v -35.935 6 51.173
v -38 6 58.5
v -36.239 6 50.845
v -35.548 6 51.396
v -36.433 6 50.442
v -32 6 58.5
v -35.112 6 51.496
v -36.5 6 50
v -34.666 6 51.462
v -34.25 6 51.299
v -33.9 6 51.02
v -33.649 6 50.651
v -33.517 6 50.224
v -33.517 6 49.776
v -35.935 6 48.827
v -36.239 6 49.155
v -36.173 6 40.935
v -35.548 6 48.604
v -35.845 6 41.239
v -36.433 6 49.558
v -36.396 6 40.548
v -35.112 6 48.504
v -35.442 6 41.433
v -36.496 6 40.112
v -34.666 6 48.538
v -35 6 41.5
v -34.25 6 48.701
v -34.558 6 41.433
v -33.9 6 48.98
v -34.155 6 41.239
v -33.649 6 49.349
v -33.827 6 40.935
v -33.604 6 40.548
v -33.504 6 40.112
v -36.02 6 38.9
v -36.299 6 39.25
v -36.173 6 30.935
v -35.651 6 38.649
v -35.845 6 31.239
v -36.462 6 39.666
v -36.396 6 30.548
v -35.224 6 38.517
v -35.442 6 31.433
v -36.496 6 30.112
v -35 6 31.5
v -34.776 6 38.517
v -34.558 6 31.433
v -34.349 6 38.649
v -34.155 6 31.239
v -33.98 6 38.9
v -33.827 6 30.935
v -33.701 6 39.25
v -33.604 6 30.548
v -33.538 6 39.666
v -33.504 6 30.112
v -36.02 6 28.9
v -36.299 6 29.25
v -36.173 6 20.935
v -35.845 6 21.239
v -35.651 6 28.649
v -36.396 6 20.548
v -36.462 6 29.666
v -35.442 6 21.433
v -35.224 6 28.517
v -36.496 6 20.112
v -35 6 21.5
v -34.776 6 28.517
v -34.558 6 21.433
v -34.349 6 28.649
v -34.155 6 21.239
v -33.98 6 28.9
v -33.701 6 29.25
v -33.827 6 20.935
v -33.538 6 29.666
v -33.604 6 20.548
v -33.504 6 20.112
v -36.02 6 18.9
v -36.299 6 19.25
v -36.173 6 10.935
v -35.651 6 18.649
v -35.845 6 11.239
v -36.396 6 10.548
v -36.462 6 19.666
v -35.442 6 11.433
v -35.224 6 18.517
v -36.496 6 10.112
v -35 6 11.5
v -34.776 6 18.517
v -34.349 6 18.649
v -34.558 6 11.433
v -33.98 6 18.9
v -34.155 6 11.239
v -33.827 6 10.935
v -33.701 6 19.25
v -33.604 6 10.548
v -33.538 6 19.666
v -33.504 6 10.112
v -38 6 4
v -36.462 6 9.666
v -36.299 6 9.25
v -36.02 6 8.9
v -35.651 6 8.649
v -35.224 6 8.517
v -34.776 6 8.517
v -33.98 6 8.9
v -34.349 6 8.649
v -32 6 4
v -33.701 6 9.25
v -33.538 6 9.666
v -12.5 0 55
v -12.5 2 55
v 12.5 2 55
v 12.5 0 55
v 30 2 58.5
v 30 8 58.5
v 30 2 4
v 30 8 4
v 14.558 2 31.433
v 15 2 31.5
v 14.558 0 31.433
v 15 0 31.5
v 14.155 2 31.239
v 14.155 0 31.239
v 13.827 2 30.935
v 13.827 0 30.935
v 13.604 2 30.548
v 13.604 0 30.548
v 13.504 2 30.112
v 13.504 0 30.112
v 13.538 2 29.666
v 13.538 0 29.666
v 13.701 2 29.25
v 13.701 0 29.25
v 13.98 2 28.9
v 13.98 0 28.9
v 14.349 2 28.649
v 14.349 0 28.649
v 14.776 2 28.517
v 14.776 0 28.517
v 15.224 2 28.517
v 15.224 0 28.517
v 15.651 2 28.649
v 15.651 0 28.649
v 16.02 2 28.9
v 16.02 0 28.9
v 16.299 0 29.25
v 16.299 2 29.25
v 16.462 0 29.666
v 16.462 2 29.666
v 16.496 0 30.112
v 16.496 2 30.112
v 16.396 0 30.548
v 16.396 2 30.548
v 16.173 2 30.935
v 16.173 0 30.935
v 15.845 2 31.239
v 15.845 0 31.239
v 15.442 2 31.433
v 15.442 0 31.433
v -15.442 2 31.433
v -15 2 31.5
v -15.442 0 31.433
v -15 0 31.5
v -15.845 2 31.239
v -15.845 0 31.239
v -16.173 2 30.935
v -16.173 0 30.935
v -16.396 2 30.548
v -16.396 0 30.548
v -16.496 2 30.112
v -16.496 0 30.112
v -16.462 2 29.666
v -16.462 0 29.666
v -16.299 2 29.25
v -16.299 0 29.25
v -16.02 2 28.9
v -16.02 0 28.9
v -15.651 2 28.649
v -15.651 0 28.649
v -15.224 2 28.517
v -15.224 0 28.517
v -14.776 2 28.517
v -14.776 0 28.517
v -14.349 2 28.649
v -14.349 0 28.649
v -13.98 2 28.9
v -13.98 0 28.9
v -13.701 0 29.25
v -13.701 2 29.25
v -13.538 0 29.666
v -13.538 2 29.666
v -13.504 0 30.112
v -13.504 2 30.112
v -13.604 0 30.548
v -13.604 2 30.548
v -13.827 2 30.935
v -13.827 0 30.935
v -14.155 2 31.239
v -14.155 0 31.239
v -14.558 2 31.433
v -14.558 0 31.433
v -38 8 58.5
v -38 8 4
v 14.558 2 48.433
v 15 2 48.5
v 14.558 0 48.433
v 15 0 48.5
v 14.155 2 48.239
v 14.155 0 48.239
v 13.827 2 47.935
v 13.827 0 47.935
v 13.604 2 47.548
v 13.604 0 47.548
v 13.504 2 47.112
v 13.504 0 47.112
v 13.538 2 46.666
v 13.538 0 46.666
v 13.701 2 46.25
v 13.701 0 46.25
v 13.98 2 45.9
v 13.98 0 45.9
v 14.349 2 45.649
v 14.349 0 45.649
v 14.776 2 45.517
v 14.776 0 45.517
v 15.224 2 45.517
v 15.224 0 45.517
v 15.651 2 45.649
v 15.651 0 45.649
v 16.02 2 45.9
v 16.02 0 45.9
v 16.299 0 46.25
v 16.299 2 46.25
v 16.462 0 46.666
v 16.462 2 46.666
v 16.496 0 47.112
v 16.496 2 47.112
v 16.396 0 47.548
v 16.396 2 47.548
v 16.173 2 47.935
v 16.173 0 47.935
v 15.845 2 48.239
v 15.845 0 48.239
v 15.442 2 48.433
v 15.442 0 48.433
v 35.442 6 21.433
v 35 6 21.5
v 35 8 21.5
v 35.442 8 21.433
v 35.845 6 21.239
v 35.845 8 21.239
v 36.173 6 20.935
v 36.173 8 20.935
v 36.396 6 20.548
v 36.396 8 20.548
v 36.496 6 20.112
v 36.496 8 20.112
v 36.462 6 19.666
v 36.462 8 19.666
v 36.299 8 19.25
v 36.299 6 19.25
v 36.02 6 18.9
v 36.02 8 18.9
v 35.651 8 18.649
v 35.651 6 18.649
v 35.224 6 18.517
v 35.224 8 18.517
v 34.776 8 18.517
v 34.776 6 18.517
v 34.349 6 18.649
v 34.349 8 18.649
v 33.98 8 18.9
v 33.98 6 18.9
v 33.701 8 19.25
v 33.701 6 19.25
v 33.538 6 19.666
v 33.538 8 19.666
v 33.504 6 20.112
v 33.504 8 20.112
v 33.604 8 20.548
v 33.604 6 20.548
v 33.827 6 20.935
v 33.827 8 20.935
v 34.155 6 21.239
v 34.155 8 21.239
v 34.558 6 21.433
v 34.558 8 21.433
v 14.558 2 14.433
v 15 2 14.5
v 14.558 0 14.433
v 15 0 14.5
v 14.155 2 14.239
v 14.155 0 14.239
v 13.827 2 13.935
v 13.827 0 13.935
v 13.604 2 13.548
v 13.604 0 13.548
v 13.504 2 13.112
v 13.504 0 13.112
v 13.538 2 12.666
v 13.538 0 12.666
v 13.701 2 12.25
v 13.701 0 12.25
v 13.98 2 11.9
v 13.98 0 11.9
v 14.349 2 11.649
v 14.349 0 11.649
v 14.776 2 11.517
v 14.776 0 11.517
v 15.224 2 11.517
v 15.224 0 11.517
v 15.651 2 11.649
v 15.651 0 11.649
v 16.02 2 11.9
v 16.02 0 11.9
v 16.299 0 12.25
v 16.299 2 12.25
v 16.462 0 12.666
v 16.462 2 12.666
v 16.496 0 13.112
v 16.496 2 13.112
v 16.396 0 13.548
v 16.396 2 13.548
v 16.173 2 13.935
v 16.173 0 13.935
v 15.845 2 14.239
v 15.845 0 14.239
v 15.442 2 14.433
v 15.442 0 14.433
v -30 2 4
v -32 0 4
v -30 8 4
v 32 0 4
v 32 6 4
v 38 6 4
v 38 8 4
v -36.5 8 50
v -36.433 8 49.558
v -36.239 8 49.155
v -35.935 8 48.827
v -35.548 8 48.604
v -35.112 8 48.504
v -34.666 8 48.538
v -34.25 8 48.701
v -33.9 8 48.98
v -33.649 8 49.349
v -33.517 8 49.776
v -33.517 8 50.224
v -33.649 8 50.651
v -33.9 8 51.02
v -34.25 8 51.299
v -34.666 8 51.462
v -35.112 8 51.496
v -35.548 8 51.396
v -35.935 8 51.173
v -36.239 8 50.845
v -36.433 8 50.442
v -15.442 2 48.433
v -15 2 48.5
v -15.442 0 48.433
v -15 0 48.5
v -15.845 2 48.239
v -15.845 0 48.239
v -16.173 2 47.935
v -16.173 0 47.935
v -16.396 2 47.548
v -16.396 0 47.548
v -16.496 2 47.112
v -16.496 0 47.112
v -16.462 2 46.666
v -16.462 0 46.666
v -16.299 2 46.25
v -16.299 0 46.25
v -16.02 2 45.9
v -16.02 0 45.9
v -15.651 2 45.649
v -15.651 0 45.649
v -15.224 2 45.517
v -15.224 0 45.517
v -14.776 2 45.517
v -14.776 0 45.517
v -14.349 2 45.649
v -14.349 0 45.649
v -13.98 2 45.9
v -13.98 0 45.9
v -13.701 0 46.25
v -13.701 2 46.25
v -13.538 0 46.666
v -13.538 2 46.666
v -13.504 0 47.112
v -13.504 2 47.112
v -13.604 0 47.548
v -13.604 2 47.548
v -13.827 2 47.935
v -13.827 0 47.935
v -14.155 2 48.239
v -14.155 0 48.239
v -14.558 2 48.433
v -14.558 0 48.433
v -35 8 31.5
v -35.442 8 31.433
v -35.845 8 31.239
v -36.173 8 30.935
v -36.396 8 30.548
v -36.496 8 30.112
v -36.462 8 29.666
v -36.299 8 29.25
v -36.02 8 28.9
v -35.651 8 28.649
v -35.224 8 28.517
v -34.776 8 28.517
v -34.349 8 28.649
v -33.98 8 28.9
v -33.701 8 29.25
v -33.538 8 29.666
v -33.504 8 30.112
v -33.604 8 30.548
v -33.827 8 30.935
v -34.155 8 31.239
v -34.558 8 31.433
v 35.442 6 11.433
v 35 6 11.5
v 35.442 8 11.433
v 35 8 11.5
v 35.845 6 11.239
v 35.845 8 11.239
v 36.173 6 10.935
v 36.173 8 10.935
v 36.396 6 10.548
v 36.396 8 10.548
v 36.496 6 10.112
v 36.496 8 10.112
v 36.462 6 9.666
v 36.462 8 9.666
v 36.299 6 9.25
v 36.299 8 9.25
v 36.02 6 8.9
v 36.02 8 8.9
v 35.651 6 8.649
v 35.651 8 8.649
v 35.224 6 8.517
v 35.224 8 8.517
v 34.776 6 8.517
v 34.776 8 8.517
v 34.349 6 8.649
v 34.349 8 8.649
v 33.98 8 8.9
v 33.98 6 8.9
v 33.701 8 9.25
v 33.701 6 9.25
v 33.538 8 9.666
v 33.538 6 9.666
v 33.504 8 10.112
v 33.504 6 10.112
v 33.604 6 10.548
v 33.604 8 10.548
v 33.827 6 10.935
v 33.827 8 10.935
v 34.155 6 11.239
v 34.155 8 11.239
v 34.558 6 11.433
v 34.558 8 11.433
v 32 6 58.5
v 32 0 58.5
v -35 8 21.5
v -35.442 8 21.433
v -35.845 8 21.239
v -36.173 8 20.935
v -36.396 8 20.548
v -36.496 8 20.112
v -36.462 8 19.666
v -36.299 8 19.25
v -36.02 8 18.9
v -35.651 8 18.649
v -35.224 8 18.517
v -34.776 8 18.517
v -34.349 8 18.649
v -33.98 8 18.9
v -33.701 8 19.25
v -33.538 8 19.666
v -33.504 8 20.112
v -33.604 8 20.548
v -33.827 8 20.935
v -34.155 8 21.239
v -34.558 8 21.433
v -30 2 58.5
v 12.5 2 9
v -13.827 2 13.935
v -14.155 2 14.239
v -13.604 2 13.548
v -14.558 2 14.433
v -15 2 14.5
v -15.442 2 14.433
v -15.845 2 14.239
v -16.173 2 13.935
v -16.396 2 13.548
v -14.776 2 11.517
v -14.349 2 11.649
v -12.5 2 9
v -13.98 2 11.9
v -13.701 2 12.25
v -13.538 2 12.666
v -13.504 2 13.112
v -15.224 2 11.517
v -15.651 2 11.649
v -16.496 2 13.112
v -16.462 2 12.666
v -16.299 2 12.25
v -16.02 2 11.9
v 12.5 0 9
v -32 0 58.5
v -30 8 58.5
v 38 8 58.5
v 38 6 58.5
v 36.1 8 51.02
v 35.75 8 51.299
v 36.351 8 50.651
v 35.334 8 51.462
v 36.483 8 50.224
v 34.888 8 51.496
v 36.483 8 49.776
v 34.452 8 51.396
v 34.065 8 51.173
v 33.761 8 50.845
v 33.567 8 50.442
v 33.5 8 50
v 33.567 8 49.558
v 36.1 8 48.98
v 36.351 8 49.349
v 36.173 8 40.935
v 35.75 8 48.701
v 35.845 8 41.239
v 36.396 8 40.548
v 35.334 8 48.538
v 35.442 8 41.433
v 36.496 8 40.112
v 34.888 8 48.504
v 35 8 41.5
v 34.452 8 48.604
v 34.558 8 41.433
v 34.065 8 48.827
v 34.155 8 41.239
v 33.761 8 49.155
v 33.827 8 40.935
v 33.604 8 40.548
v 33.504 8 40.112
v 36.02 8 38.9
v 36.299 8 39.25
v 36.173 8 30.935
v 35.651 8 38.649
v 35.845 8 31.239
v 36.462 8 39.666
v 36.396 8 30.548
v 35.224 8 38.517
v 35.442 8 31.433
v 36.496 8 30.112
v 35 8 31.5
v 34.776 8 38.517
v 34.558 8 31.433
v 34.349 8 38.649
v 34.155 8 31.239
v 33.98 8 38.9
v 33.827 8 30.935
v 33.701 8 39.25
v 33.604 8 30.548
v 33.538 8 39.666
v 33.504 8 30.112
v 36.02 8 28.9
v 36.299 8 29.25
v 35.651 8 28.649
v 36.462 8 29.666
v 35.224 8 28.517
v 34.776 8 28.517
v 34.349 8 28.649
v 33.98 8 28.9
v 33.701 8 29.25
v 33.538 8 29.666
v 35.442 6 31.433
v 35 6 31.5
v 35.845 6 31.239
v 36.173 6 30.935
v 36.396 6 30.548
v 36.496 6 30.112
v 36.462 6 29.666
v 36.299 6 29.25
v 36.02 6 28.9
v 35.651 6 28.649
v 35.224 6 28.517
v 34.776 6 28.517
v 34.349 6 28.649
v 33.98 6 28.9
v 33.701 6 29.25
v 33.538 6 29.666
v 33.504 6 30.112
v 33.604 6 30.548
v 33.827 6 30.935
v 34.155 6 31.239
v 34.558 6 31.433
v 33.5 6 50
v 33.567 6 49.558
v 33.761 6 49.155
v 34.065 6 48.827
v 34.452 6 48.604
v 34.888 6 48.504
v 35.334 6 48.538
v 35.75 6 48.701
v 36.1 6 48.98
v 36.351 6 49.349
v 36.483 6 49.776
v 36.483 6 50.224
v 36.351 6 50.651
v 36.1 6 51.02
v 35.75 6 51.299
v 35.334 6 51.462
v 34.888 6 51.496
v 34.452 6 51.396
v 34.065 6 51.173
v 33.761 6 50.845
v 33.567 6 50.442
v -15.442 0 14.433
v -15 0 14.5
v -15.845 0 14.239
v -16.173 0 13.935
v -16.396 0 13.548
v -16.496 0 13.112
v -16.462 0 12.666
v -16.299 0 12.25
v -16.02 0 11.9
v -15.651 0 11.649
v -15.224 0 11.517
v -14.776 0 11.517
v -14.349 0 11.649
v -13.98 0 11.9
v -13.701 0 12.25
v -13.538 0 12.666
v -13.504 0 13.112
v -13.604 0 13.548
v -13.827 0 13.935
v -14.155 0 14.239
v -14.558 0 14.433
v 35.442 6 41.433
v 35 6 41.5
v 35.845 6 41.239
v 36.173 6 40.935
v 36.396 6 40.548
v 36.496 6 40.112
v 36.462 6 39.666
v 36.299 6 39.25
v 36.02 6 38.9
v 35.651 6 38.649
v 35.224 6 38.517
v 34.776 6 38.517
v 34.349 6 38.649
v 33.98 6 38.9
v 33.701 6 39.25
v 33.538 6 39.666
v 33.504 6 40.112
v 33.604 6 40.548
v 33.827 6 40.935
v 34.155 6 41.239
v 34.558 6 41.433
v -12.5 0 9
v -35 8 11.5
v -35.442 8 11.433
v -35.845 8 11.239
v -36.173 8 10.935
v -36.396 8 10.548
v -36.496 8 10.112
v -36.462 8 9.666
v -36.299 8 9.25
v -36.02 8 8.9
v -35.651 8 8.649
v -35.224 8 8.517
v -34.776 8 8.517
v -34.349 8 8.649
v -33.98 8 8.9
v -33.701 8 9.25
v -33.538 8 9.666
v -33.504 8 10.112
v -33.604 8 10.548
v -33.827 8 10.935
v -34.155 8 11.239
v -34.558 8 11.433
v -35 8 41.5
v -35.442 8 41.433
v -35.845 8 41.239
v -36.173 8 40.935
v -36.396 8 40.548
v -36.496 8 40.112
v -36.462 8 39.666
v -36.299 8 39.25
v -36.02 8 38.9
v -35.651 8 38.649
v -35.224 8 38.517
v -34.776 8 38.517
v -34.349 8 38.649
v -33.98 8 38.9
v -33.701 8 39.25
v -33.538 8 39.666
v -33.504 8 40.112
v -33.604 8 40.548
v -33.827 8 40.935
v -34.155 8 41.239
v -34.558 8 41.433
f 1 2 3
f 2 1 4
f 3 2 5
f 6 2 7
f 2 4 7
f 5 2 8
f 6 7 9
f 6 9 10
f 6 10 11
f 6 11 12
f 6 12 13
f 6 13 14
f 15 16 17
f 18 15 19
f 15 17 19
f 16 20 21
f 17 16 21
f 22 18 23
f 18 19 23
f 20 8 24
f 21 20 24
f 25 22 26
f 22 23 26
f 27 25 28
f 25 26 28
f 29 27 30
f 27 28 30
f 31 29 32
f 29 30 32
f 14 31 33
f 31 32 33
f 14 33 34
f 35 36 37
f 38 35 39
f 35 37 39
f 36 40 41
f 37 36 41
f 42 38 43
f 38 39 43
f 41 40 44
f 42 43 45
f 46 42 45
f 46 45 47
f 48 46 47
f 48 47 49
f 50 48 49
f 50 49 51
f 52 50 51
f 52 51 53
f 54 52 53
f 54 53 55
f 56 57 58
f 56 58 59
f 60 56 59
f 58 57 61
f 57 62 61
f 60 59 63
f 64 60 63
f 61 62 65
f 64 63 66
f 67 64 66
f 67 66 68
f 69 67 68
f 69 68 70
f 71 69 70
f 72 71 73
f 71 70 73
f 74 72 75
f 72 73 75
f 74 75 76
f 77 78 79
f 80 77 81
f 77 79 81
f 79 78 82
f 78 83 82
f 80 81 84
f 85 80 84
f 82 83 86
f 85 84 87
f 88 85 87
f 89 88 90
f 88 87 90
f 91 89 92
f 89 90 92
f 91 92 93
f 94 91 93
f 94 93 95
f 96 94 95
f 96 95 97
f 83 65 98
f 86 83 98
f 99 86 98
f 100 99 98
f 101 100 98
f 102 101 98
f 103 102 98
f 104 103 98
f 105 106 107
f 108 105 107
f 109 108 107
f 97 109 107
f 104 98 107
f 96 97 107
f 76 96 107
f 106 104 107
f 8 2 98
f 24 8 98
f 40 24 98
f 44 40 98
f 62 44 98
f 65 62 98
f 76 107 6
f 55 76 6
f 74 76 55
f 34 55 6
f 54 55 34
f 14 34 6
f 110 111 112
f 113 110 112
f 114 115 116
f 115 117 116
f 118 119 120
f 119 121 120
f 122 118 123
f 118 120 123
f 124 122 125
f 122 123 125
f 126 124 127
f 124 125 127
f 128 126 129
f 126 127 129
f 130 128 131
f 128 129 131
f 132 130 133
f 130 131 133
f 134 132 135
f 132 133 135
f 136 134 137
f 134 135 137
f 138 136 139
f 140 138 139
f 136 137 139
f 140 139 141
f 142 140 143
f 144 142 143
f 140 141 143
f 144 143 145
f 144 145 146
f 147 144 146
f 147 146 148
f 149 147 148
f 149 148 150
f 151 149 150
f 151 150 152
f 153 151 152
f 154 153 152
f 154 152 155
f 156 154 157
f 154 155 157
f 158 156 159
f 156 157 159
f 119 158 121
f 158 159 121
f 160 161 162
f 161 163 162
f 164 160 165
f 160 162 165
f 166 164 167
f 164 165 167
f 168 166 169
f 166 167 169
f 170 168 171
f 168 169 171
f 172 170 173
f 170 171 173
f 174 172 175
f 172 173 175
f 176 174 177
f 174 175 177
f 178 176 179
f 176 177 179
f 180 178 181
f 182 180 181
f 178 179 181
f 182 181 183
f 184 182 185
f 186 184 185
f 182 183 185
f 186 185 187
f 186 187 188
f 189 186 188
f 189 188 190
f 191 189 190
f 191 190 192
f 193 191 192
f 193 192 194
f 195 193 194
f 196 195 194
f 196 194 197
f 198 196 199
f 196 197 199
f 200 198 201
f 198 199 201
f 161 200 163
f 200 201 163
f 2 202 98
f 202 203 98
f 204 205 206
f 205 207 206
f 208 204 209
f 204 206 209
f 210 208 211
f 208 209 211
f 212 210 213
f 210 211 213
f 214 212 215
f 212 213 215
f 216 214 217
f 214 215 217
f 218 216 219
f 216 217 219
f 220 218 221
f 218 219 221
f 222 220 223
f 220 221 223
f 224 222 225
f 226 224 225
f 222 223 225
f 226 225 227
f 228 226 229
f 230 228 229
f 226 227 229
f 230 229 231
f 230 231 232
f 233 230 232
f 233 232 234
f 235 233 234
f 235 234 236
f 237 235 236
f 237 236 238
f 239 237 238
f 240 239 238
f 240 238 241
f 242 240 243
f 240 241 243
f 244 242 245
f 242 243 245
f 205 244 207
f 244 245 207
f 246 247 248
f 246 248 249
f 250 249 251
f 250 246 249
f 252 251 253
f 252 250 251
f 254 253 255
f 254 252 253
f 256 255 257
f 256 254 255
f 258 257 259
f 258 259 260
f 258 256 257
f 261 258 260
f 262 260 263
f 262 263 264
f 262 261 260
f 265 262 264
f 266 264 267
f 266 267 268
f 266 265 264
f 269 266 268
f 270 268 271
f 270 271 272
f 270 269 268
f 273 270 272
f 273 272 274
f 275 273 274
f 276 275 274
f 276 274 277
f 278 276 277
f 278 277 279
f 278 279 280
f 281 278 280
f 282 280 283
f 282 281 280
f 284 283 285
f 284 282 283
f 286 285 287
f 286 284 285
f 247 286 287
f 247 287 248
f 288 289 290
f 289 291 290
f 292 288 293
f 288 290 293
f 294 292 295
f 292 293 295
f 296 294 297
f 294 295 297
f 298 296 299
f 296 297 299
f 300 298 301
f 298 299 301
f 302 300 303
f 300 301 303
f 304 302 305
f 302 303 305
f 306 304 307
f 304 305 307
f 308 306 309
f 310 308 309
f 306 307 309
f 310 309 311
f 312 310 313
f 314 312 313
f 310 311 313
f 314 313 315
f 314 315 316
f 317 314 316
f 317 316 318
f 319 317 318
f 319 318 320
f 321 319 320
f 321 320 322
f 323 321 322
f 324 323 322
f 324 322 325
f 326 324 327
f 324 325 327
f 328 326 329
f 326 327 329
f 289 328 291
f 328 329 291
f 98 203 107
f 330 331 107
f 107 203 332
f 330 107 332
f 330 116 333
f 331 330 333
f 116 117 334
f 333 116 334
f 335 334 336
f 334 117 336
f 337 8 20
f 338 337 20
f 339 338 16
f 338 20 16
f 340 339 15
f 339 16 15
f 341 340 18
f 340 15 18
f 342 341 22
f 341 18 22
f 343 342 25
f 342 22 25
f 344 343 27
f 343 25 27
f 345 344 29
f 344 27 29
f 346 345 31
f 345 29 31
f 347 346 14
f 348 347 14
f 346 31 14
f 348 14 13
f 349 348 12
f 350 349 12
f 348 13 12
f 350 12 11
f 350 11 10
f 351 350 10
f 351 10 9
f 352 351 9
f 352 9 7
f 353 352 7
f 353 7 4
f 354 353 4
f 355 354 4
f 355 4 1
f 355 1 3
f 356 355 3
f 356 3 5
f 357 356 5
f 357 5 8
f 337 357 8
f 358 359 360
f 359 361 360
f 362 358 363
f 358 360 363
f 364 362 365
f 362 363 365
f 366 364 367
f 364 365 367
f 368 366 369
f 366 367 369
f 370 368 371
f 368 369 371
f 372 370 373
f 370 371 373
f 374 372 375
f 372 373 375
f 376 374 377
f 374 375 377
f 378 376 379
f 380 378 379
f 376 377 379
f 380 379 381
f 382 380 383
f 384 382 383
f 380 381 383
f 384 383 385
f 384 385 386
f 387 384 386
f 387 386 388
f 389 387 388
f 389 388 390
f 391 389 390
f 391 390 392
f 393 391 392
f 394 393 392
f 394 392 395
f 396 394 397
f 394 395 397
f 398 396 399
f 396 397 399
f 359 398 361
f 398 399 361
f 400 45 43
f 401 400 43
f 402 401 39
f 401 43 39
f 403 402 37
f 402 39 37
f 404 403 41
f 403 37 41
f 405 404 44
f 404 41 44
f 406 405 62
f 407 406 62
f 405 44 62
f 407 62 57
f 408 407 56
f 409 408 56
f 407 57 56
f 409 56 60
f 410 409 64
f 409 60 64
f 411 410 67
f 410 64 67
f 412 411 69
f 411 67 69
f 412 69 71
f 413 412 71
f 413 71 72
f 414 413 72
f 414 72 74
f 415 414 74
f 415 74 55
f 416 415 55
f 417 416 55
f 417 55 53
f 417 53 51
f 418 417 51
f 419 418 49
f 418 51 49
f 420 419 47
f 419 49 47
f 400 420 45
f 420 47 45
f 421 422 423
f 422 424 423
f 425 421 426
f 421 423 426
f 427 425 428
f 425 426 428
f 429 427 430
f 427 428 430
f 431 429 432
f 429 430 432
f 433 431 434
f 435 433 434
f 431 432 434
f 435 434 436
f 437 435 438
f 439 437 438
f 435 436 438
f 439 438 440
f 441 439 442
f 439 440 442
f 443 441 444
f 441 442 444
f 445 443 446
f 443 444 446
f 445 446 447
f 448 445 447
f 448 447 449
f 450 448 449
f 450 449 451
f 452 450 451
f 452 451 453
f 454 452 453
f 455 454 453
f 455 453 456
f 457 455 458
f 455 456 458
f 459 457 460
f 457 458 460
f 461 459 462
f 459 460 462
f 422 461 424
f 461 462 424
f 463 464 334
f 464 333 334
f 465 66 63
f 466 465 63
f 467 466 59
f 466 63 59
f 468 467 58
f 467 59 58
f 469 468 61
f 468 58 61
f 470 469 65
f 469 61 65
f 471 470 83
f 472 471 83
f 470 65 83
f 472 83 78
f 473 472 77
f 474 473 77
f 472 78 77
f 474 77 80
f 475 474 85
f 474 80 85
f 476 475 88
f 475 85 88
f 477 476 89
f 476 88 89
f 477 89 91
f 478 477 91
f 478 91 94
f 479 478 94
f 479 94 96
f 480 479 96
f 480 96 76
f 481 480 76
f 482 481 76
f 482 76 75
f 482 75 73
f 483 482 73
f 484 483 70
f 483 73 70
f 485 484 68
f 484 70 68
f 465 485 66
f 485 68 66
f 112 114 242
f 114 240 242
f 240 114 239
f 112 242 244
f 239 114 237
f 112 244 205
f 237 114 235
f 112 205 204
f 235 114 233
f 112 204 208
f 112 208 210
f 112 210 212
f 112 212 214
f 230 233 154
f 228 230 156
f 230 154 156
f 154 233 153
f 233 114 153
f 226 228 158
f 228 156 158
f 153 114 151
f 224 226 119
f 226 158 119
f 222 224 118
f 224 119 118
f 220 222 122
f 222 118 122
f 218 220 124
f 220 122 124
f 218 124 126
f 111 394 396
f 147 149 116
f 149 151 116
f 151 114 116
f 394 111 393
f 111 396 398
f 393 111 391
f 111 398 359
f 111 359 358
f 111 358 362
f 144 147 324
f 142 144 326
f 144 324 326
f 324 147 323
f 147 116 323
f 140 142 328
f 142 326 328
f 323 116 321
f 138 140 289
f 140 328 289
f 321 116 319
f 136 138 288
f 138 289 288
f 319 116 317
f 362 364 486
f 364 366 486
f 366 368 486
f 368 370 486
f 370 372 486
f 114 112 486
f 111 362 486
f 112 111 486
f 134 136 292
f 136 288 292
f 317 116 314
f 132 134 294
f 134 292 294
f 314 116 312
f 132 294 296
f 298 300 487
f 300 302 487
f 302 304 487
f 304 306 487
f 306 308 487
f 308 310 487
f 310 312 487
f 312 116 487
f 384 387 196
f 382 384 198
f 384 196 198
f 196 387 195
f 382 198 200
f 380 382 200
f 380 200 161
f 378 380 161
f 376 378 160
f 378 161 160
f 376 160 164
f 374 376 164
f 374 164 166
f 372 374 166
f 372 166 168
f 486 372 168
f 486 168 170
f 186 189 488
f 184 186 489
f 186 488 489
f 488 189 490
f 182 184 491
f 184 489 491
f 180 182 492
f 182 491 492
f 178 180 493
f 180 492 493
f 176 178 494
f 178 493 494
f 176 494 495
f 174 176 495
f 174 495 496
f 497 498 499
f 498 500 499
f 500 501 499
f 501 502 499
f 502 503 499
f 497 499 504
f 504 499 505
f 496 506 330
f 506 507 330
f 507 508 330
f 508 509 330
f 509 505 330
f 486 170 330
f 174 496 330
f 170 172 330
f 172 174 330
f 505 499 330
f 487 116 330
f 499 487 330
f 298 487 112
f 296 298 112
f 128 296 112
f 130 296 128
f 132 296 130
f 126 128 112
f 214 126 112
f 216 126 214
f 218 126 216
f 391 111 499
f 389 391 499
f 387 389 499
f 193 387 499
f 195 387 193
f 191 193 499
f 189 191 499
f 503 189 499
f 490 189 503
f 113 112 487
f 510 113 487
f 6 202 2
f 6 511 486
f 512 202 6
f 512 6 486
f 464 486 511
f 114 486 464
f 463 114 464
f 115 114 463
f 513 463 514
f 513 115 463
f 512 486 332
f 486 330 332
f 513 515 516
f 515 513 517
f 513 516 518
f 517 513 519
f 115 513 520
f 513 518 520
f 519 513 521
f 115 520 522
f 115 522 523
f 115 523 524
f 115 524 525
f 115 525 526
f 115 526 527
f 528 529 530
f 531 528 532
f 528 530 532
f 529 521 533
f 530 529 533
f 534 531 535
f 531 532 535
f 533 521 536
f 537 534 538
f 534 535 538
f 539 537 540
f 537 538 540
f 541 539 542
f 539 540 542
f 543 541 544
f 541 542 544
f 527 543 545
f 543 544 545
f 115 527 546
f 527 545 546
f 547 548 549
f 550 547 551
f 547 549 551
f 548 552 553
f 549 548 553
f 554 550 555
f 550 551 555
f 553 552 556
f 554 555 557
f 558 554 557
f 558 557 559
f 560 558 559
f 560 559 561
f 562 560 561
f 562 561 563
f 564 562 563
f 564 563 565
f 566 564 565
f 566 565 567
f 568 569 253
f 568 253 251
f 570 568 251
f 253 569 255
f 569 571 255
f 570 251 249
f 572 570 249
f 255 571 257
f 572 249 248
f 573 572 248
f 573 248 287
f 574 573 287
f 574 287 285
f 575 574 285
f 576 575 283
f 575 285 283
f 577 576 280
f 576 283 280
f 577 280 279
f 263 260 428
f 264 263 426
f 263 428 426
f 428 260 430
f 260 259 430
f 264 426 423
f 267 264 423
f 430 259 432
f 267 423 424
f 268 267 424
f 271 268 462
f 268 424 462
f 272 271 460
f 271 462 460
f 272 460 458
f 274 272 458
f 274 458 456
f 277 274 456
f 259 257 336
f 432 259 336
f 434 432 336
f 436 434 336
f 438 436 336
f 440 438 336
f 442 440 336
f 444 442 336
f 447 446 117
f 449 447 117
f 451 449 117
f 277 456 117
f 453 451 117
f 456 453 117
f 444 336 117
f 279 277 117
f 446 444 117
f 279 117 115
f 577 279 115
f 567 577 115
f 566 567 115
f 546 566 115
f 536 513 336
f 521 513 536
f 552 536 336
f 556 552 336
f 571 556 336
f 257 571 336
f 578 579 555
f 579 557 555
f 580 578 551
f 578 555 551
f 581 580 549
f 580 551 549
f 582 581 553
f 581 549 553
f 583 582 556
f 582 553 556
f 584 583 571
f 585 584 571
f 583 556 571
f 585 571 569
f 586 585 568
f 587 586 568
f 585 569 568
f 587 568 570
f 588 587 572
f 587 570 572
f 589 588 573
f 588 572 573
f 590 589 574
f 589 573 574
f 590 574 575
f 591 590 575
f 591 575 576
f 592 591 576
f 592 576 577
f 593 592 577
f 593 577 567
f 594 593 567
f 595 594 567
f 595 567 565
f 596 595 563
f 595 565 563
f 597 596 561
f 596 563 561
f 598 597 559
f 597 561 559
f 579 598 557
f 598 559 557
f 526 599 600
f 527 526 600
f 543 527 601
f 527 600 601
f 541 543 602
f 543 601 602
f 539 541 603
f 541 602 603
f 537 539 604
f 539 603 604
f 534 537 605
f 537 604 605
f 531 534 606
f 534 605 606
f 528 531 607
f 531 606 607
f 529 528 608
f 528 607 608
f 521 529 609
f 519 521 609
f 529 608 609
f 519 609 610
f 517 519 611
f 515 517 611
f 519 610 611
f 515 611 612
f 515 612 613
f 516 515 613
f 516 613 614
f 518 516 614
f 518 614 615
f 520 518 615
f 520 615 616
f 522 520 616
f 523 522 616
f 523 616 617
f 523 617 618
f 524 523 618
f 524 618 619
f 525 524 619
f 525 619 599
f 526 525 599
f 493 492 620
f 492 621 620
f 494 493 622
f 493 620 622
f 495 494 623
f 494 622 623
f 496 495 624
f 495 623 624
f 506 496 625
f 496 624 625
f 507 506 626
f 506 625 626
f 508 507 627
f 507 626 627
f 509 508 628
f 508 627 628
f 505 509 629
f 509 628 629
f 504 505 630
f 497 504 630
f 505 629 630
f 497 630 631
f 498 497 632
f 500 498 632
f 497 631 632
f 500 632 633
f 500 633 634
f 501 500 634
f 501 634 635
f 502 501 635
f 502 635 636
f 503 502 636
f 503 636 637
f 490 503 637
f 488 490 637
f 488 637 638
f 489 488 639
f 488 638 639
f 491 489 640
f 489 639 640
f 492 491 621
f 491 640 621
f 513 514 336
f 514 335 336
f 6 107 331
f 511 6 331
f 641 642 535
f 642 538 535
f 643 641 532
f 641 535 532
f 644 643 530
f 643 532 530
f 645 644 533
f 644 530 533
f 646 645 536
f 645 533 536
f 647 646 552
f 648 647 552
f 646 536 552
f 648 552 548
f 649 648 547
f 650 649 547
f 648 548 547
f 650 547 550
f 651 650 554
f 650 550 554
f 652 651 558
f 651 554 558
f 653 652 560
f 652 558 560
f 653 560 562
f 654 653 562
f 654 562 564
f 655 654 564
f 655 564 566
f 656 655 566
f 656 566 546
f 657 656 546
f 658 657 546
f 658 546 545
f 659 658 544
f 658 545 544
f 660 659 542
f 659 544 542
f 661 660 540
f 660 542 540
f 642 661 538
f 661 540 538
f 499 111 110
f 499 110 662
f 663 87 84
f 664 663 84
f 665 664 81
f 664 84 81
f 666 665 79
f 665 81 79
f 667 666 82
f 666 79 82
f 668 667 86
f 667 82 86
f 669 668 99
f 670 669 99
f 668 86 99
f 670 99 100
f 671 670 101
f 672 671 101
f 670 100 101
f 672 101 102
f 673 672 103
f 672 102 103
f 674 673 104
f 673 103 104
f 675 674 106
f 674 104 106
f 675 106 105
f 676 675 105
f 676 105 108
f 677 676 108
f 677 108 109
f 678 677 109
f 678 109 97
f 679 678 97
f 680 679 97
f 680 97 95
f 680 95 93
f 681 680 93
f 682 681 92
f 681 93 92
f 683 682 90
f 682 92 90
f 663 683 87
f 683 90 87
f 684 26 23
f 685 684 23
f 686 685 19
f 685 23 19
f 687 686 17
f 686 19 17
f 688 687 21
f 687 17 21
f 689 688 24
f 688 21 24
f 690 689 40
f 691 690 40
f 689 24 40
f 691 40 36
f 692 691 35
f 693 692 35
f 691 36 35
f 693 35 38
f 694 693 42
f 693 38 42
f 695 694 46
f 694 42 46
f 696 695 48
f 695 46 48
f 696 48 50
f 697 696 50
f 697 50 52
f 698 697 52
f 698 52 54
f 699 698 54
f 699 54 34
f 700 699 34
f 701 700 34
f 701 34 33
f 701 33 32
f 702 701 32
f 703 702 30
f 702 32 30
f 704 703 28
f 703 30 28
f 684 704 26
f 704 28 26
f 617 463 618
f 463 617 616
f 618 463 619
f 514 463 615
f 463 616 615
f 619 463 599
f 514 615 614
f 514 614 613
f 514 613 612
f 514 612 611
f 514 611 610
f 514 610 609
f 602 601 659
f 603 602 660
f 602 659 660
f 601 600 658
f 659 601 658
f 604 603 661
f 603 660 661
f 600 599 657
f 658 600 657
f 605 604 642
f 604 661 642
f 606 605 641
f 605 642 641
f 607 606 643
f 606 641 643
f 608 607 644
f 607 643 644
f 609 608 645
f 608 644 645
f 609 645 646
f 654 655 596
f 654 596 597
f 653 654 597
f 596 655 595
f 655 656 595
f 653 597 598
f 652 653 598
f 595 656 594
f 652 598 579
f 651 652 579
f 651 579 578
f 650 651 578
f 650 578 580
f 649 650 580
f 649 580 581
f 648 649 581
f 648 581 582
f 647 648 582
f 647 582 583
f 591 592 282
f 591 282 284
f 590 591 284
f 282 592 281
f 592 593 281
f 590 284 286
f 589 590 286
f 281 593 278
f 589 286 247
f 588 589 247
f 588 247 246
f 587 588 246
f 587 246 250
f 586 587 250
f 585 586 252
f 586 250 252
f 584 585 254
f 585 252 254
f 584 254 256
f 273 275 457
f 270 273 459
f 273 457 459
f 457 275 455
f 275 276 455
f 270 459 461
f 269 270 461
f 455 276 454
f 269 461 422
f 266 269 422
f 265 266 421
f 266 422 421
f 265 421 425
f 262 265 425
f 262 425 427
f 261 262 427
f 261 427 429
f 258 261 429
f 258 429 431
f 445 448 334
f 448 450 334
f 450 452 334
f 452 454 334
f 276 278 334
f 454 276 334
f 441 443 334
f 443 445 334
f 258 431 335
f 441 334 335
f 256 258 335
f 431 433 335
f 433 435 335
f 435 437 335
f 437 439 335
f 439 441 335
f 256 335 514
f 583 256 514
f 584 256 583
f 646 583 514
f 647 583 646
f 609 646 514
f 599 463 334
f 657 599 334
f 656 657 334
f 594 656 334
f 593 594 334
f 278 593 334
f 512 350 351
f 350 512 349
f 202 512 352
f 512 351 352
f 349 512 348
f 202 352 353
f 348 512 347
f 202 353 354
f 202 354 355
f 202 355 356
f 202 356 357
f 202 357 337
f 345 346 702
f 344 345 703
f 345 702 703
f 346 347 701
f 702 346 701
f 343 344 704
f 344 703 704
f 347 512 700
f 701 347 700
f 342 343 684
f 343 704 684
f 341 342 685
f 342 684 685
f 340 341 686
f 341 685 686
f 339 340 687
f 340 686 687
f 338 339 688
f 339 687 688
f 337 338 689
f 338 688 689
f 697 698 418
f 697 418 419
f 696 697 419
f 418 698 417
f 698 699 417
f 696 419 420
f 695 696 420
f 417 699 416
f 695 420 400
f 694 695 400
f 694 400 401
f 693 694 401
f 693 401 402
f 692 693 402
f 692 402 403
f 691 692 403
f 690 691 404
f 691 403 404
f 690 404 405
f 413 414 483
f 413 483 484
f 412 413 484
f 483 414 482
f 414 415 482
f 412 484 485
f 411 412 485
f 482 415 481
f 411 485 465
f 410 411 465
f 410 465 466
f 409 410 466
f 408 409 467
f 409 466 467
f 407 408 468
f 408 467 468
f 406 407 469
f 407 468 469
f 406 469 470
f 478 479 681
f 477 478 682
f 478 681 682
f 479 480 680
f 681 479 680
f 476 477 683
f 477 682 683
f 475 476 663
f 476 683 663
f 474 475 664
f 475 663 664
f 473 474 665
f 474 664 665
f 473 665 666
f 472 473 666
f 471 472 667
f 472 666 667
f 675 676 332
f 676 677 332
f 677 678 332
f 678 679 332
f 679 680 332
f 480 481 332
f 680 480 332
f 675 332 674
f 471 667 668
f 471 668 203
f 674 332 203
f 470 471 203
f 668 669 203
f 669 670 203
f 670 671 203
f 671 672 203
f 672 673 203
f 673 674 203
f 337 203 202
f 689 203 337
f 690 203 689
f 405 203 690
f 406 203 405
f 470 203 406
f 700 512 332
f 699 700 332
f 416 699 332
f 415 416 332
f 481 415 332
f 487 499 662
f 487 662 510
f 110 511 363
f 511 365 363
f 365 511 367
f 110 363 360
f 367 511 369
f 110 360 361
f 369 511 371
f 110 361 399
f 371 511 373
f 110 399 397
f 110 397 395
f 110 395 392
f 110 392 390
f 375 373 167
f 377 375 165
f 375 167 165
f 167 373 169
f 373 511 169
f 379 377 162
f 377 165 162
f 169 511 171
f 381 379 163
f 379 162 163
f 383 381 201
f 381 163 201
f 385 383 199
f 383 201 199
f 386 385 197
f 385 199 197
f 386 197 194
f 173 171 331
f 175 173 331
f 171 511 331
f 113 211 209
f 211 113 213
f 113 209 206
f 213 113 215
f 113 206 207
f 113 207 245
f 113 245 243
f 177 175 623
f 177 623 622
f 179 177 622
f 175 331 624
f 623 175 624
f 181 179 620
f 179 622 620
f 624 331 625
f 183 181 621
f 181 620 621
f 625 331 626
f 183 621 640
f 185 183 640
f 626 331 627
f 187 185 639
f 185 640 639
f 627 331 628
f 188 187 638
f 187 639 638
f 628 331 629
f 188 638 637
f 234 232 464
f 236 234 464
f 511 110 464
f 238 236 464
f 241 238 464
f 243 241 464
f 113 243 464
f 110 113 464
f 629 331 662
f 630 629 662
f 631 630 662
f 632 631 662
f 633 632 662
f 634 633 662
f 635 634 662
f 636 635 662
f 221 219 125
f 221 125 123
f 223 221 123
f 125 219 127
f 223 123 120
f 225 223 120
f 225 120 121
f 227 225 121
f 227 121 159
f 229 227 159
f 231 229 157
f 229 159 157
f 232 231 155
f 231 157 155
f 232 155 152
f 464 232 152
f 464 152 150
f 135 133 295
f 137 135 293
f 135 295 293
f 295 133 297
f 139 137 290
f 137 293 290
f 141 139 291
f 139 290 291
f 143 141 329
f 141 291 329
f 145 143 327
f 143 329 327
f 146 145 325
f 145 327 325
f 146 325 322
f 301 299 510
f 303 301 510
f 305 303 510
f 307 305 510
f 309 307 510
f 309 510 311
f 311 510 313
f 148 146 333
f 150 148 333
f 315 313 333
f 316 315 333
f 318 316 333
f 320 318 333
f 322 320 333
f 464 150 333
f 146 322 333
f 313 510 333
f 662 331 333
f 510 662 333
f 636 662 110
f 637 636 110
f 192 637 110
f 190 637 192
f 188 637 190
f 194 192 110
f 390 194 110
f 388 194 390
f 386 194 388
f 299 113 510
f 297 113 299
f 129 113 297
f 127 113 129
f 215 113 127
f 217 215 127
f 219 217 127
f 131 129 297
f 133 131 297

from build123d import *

# Parameters (mm, degrees)
BOSS_EXTRUDE1_DEPTH            = 50
BOSS_EXTRUDE1_2_DEPTH          = 50
SKETCH4_W                      = 1.5
SKETCH4_H                      = 2
F_3_0MM_DOWEL_HOLE1_AT_2_COUNT = 2
F_3_0MM_DOWEL_HOLE1_AT_2_PITCH = 17
F_3_0MM_DOWEL_HOLE1_AT_3_COUNT = 2
F_3_0MM_DOWEL_HOLE1_AT_3_PITCH = 34
F_3_0MM_DOWEL_HOLE1_AT_4_COUNT = 2
F_3_0MM_DOWEL_HOLE1_AT_4_PITCH = 45.343136195
F_3_0MM_DOWEL_HOLE1_AT_5_COUNT = 2
F_3_0MM_DOWEL_HOLE1_AT_5_PITCH = 34.481879299
F_3_0MM_DOWEL_HOLE1_AT_6_COUNT = 2
F_3_0MM_DOWEL_HOLE1_AT_6_PITCH = 30
SKETCH7_W                      = 1.5
SKETCH7_H                      = 8
F_3_0MM_DOWEL_HOLE2_AT_2_COUNT = 2
F_3_0MM_DOWEL_HOLE2_AT_2_PITCH = 10
F_3_0MM_DOWEL_HOLE2_AT_3_COUNT = 2
F_3_0MM_DOWEL_HOLE2_AT_3_PITCH = 10
F_3_0MM_DOWEL_HOLE2_AT_4_COUNT = 2
F_3_0MM_DOWEL_HOLE2_AT_4_PITCH = 20
SKETCH9_W                      = 25
SKETCH9_H                      = 9
BOSS_EXTRUDE3_DEPTH            = 2
MIRROR1_COPY_1_SKETCH_W        = 1.5
MIRROR1_COPY_1_SKETCH_H        = 8
MIRROR1_COPY_2_SKETCH_W        = 1.5
MIRROR1_COPY_2_SKETCH_H        = 8
MIRROR1_COPY_3_SKETCH_W        = 1.5
MIRROR1_COPY_3_SKETCH_H        = 8
SKETCH10_W                     = 76
SKETCH10_H                     = 4
CUT_EXTRUDE1_DEPTH             = 10
BOSS_EXTRUDE4_DEPTH            = 8.5
SKETCH13_W                     = 25
SKETCH13_H                     = 5
CUT_EXTRUDE2_DEPTH             = 8.5
F_3_0MM_DOWEL_HOLE3_D          = 3


with BuildPart() as part:
    # Sketch1 → Boss-Extrude1 (new body)
    with BuildSketch(Plane.XY):
        Polygon((12.5, 0), (12.5, 2), (30, 2), (30, 8), (38, 8), (38, 6), (32, 6), (32, 0), align=None)
    extrude(amount=BOSS_EXTRUDE1_DEPTH)


with BuildPart() as body_2:
    # Sketch1 → Boss-Extrude1 2 (new body)
    with BuildSketch(Plane.XY):
        Polygon((-12.5, 2), (-30, 2), (-30, 8), (-38, 8), (-38, 6), (-32, 6), (-32, 0), (-12.5, 0), align=None)
    extrude(amount=BOSS_EXTRUDE1_2_DEPTH)

    # Sketch4 → Ø3.0mm Dowel Hole1 (revolve, cut)
    with BuildSketch(Plane(origin=(-15, 2, 47), x_dir=(0, 0, 1), z_dir=(1, 0, 0))):
        with Locations((0.75, 1)):
            Rectangle(SKETCH4_W, SKETCH4_H)
    f_3_0mm_dowel_hole1 = revolve(axis=Axis((-15, 8.35, 47), (0, -1, 0)), mode=Mode.SUBTRACT)

    # Ø3.0mm Dowel Hole1 at 2: Ø3.0mm Dowel Hole1 ×2
    with Locations(*[(0, 0, -i * F_3_0MM_DOWEL_HOLE1_AT_2_PITCH) for i in range(1, F_3_0MM_DOWEL_HOLE1_AT_2_COUNT)]):
        add(f_3_0mm_dowel_hole1, mode=Mode.SUBTRACT)

    # Ø3.0mm Dowel Hole1 at 3: Ø3.0mm Dowel Hole1 ×2
    with Locations(*[(0, 0, -i * F_3_0MM_DOWEL_HOLE1_AT_3_PITCH) for i in range(1, F_3_0MM_DOWEL_HOLE1_AT_3_COUNT)]):
        add(f_3_0mm_dowel_hole1, mode=Mode.SUBTRACT)

    # Sketch7 → Ø3.0mm Dowel Hole2 (revolve, cut)
    with BuildSketch(Plane(origin=(-35, 8, 20), x_dir=(0, 0, 1), z_dir=(1, 0, 0))):
        with Locations((0.75, 4)):
            Rectangle(SKETCH7_W, SKETCH7_H)
    f_3_0mm_dowel_hole2 = revolve(axis=Axis((-35, 14.35, 20), (0, -1, 0)), mode=Mode.SUBTRACT)

    # Ø3.0mm Dowel Hole2 at 2: Ø3.0mm Dowel Hole2 ×2
    with Locations(*[(0, 0, -i * F_3_0MM_DOWEL_HOLE2_AT_2_PITCH) for i in range(1, F_3_0MM_DOWEL_HOLE2_AT_2_COUNT)]):
        add(f_3_0mm_dowel_hole2, mode=Mode.SUBTRACT)

    # Ø3.0mm Dowel Hole2 at 3: Ø3.0mm Dowel Hole2 ×2
    with Locations(*[(0, 0, i * F_3_0MM_DOWEL_HOLE2_AT_3_PITCH) for i in range(1, F_3_0MM_DOWEL_HOLE2_AT_3_COUNT)]):
        add(f_3_0mm_dowel_hole2, mode=Mode.SUBTRACT)

    # Ø3.0mm Dowel Hole2 at 4: Ø3.0mm Dowel Hole2 ×2
    with Locations(*[(0, 0, i * F_3_0MM_DOWEL_HOLE2_AT_4_PITCH) for i in range(1, F_3_0MM_DOWEL_HOLE2_AT_4_COUNT)]):
        add(f_3_0mm_dowel_hole2, mode=Mode.SUBTRACT)


with BuildPart() as part_1:
    add(part.part)

    # Ø3.0mm Dowel Hole1 at 4: Ø3.0mm Dowel Hole1 ×2
    with Locations(*[Vector(0.661621637, 0, -0.749837855) * (i * F_3_0MM_DOWEL_HOLE1_AT_4_PITCH) for i in range(1, F_3_0MM_DOWEL_HOLE1_AT_4_COUNT)]):
        add(f_3_0mm_dowel_hole1, mode=Mode.SUBTRACT)

    # Ø3.0mm Dowel Hole1 at 5: Ø3.0mm Dowel Hole1 ×2
    with Locations(*[Vector(0.870022186, 0, -0.493012572) * (i * F_3_0MM_DOWEL_HOLE1_AT_5_PITCH) for i in range(1, F_3_0MM_DOWEL_HOLE1_AT_5_COUNT)]):
        add(f_3_0mm_dowel_hole1, mode=Mode.SUBTRACT)

    # Ø3.0mm Dowel Hole1 at 6: Ø3.0mm Dowel Hole1 ×2
    with Locations(*[(i * F_3_0MM_DOWEL_HOLE1_AT_6_PITCH, 0, 0) for i in range(1, F_3_0MM_DOWEL_HOLE1_AT_6_COUNT)]):
        add(f_3_0mm_dowel_hole1, mode=Mode.SUBTRACT)

    add(body_2.part)  # Boss-Extrude3 merges body 2
    # Sketch9 → Boss-Extrude3 (add)
    with BuildSketch(Plane(origin=(0, 2, 0), x_dir=(1, 0, 0), z_dir=(0, 1, 0))):
        with Locations((0, -4.5)):
            Rectangle(SKETCH9_W, SKETCH9_H)
    extrude(amount=-BOSS_EXTRUDE3_DEPTH)

    # Mirror1: Ø3.0mm Dowel Hole2 across plane
    add(f_3_0mm_dowel_hole2.mirror(Plane(origin=(0, 0, 0), x_dir=(0, 0, 1), z_dir=(1, 0, 0))), mode=Mode.SUBTRACT)

    # Mirror1 copy 1 sketch → Mirror1 copy 1 (revolve, cut)
    with BuildSketch(Plane(origin=(35, 8, 10), x_dir=(0, 0, 1), z_dir=(-1, 0, 0))):
        with Locations((0.75, -4)):
            Rectangle(MIRROR1_COPY_1_SKETCH_W, MIRROR1_COPY_1_SKETCH_H)
    revolve(axis=Axis((35, 14.35, 10), (0, 1, 0)), mode=Mode.SUBTRACT)

    # Mirror1 copy 2 sketch → Mirror1 copy 2 (revolve, cut)
    with BuildSketch(Plane(origin=(35, 8, 30), x_dir=(0, 0, 1), z_dir=(-1, 0, 0))):
        with Locations((0.75, -4)):
            Rectangle(MIRROR1_COPY_2_SKETCH_W, MIRROR1_COPY_2_SKETCH_H)
    revolve(axis=Axis((35, 14.35, 30), (0, 1, 0)), mode=Mode.SUBTRACT)

    # Mirror1 copy 3 sketch → Mirror1 copy 3 (revolve, cut)
    with BuildSketch(Plane(origin=(35, 8, 40), x_dir=(0, 0, 1), z_dir=(-1, 0, 0))):
        with Locations((0.75, -4)):
            Rectangle(MIRROR1_COPY_3_SKETCH_W, MIRROR1_COPY_3_SKETCH_H)
    revolve(axis=Axis((35, 14.35, 40), (0, 1, 0)), mode=Mode.SUBTRACT)

    # Sketch10 → Cut-Extrude1 (cut)
    with BuildSketch(Plane(origin=(0, 8, 0), x_dir=(1, 0, 0), z_dir=(0, 1, 0))):
        with Locations((0, -2)):
            Rectangle(SKETCH10_W, SKETCH10_H)
    extrude(amount=-CUT_EXTRUDE1_DEPTH, mode=Mode.SUBTRACT)

    # Sketch12 → Boss-Extrude4 (add)
    with BuildSketch(Plane.XY.offset(50)):
        Polygon((-32, 0), (32, 0), (32, 6), (38, 6), (38, 8), (30, 8), (30, 2), (-30, 2), (-30, 8), (-38, 8), (-38, 6), (-32, 6), align=None)
    extrude(amount=BOSS_EXTRUDE4_DEPTH)

    # Sketch13 → Cut-Extrude2 (cut)
    with BuildSketch(Plane(origin=(0, 2, 0), x_dir=(1, 0, 0), z_dir=(0, 1, 0))):
        with Locations((0, -52.5)):
            Rectangle(SKETCH13_W, SKETCH13_H)
    extrude(amount=-CUT_EXTRUDE2_DEPTH, mode=Mode.SUBTRACT)

    # Ø3.0mm Dowel Hole3 (through all)
    with Locations(Plane(origin=(0, 8, 0), x_dir=(1, 0, 0), z_dir=(0, 1, 0))):
        with Locations((35, -50), (-35, -50)):
            Hole(F_3_0MM_DOWEL_HOLE3_D / 2)


solid = part_1.part
